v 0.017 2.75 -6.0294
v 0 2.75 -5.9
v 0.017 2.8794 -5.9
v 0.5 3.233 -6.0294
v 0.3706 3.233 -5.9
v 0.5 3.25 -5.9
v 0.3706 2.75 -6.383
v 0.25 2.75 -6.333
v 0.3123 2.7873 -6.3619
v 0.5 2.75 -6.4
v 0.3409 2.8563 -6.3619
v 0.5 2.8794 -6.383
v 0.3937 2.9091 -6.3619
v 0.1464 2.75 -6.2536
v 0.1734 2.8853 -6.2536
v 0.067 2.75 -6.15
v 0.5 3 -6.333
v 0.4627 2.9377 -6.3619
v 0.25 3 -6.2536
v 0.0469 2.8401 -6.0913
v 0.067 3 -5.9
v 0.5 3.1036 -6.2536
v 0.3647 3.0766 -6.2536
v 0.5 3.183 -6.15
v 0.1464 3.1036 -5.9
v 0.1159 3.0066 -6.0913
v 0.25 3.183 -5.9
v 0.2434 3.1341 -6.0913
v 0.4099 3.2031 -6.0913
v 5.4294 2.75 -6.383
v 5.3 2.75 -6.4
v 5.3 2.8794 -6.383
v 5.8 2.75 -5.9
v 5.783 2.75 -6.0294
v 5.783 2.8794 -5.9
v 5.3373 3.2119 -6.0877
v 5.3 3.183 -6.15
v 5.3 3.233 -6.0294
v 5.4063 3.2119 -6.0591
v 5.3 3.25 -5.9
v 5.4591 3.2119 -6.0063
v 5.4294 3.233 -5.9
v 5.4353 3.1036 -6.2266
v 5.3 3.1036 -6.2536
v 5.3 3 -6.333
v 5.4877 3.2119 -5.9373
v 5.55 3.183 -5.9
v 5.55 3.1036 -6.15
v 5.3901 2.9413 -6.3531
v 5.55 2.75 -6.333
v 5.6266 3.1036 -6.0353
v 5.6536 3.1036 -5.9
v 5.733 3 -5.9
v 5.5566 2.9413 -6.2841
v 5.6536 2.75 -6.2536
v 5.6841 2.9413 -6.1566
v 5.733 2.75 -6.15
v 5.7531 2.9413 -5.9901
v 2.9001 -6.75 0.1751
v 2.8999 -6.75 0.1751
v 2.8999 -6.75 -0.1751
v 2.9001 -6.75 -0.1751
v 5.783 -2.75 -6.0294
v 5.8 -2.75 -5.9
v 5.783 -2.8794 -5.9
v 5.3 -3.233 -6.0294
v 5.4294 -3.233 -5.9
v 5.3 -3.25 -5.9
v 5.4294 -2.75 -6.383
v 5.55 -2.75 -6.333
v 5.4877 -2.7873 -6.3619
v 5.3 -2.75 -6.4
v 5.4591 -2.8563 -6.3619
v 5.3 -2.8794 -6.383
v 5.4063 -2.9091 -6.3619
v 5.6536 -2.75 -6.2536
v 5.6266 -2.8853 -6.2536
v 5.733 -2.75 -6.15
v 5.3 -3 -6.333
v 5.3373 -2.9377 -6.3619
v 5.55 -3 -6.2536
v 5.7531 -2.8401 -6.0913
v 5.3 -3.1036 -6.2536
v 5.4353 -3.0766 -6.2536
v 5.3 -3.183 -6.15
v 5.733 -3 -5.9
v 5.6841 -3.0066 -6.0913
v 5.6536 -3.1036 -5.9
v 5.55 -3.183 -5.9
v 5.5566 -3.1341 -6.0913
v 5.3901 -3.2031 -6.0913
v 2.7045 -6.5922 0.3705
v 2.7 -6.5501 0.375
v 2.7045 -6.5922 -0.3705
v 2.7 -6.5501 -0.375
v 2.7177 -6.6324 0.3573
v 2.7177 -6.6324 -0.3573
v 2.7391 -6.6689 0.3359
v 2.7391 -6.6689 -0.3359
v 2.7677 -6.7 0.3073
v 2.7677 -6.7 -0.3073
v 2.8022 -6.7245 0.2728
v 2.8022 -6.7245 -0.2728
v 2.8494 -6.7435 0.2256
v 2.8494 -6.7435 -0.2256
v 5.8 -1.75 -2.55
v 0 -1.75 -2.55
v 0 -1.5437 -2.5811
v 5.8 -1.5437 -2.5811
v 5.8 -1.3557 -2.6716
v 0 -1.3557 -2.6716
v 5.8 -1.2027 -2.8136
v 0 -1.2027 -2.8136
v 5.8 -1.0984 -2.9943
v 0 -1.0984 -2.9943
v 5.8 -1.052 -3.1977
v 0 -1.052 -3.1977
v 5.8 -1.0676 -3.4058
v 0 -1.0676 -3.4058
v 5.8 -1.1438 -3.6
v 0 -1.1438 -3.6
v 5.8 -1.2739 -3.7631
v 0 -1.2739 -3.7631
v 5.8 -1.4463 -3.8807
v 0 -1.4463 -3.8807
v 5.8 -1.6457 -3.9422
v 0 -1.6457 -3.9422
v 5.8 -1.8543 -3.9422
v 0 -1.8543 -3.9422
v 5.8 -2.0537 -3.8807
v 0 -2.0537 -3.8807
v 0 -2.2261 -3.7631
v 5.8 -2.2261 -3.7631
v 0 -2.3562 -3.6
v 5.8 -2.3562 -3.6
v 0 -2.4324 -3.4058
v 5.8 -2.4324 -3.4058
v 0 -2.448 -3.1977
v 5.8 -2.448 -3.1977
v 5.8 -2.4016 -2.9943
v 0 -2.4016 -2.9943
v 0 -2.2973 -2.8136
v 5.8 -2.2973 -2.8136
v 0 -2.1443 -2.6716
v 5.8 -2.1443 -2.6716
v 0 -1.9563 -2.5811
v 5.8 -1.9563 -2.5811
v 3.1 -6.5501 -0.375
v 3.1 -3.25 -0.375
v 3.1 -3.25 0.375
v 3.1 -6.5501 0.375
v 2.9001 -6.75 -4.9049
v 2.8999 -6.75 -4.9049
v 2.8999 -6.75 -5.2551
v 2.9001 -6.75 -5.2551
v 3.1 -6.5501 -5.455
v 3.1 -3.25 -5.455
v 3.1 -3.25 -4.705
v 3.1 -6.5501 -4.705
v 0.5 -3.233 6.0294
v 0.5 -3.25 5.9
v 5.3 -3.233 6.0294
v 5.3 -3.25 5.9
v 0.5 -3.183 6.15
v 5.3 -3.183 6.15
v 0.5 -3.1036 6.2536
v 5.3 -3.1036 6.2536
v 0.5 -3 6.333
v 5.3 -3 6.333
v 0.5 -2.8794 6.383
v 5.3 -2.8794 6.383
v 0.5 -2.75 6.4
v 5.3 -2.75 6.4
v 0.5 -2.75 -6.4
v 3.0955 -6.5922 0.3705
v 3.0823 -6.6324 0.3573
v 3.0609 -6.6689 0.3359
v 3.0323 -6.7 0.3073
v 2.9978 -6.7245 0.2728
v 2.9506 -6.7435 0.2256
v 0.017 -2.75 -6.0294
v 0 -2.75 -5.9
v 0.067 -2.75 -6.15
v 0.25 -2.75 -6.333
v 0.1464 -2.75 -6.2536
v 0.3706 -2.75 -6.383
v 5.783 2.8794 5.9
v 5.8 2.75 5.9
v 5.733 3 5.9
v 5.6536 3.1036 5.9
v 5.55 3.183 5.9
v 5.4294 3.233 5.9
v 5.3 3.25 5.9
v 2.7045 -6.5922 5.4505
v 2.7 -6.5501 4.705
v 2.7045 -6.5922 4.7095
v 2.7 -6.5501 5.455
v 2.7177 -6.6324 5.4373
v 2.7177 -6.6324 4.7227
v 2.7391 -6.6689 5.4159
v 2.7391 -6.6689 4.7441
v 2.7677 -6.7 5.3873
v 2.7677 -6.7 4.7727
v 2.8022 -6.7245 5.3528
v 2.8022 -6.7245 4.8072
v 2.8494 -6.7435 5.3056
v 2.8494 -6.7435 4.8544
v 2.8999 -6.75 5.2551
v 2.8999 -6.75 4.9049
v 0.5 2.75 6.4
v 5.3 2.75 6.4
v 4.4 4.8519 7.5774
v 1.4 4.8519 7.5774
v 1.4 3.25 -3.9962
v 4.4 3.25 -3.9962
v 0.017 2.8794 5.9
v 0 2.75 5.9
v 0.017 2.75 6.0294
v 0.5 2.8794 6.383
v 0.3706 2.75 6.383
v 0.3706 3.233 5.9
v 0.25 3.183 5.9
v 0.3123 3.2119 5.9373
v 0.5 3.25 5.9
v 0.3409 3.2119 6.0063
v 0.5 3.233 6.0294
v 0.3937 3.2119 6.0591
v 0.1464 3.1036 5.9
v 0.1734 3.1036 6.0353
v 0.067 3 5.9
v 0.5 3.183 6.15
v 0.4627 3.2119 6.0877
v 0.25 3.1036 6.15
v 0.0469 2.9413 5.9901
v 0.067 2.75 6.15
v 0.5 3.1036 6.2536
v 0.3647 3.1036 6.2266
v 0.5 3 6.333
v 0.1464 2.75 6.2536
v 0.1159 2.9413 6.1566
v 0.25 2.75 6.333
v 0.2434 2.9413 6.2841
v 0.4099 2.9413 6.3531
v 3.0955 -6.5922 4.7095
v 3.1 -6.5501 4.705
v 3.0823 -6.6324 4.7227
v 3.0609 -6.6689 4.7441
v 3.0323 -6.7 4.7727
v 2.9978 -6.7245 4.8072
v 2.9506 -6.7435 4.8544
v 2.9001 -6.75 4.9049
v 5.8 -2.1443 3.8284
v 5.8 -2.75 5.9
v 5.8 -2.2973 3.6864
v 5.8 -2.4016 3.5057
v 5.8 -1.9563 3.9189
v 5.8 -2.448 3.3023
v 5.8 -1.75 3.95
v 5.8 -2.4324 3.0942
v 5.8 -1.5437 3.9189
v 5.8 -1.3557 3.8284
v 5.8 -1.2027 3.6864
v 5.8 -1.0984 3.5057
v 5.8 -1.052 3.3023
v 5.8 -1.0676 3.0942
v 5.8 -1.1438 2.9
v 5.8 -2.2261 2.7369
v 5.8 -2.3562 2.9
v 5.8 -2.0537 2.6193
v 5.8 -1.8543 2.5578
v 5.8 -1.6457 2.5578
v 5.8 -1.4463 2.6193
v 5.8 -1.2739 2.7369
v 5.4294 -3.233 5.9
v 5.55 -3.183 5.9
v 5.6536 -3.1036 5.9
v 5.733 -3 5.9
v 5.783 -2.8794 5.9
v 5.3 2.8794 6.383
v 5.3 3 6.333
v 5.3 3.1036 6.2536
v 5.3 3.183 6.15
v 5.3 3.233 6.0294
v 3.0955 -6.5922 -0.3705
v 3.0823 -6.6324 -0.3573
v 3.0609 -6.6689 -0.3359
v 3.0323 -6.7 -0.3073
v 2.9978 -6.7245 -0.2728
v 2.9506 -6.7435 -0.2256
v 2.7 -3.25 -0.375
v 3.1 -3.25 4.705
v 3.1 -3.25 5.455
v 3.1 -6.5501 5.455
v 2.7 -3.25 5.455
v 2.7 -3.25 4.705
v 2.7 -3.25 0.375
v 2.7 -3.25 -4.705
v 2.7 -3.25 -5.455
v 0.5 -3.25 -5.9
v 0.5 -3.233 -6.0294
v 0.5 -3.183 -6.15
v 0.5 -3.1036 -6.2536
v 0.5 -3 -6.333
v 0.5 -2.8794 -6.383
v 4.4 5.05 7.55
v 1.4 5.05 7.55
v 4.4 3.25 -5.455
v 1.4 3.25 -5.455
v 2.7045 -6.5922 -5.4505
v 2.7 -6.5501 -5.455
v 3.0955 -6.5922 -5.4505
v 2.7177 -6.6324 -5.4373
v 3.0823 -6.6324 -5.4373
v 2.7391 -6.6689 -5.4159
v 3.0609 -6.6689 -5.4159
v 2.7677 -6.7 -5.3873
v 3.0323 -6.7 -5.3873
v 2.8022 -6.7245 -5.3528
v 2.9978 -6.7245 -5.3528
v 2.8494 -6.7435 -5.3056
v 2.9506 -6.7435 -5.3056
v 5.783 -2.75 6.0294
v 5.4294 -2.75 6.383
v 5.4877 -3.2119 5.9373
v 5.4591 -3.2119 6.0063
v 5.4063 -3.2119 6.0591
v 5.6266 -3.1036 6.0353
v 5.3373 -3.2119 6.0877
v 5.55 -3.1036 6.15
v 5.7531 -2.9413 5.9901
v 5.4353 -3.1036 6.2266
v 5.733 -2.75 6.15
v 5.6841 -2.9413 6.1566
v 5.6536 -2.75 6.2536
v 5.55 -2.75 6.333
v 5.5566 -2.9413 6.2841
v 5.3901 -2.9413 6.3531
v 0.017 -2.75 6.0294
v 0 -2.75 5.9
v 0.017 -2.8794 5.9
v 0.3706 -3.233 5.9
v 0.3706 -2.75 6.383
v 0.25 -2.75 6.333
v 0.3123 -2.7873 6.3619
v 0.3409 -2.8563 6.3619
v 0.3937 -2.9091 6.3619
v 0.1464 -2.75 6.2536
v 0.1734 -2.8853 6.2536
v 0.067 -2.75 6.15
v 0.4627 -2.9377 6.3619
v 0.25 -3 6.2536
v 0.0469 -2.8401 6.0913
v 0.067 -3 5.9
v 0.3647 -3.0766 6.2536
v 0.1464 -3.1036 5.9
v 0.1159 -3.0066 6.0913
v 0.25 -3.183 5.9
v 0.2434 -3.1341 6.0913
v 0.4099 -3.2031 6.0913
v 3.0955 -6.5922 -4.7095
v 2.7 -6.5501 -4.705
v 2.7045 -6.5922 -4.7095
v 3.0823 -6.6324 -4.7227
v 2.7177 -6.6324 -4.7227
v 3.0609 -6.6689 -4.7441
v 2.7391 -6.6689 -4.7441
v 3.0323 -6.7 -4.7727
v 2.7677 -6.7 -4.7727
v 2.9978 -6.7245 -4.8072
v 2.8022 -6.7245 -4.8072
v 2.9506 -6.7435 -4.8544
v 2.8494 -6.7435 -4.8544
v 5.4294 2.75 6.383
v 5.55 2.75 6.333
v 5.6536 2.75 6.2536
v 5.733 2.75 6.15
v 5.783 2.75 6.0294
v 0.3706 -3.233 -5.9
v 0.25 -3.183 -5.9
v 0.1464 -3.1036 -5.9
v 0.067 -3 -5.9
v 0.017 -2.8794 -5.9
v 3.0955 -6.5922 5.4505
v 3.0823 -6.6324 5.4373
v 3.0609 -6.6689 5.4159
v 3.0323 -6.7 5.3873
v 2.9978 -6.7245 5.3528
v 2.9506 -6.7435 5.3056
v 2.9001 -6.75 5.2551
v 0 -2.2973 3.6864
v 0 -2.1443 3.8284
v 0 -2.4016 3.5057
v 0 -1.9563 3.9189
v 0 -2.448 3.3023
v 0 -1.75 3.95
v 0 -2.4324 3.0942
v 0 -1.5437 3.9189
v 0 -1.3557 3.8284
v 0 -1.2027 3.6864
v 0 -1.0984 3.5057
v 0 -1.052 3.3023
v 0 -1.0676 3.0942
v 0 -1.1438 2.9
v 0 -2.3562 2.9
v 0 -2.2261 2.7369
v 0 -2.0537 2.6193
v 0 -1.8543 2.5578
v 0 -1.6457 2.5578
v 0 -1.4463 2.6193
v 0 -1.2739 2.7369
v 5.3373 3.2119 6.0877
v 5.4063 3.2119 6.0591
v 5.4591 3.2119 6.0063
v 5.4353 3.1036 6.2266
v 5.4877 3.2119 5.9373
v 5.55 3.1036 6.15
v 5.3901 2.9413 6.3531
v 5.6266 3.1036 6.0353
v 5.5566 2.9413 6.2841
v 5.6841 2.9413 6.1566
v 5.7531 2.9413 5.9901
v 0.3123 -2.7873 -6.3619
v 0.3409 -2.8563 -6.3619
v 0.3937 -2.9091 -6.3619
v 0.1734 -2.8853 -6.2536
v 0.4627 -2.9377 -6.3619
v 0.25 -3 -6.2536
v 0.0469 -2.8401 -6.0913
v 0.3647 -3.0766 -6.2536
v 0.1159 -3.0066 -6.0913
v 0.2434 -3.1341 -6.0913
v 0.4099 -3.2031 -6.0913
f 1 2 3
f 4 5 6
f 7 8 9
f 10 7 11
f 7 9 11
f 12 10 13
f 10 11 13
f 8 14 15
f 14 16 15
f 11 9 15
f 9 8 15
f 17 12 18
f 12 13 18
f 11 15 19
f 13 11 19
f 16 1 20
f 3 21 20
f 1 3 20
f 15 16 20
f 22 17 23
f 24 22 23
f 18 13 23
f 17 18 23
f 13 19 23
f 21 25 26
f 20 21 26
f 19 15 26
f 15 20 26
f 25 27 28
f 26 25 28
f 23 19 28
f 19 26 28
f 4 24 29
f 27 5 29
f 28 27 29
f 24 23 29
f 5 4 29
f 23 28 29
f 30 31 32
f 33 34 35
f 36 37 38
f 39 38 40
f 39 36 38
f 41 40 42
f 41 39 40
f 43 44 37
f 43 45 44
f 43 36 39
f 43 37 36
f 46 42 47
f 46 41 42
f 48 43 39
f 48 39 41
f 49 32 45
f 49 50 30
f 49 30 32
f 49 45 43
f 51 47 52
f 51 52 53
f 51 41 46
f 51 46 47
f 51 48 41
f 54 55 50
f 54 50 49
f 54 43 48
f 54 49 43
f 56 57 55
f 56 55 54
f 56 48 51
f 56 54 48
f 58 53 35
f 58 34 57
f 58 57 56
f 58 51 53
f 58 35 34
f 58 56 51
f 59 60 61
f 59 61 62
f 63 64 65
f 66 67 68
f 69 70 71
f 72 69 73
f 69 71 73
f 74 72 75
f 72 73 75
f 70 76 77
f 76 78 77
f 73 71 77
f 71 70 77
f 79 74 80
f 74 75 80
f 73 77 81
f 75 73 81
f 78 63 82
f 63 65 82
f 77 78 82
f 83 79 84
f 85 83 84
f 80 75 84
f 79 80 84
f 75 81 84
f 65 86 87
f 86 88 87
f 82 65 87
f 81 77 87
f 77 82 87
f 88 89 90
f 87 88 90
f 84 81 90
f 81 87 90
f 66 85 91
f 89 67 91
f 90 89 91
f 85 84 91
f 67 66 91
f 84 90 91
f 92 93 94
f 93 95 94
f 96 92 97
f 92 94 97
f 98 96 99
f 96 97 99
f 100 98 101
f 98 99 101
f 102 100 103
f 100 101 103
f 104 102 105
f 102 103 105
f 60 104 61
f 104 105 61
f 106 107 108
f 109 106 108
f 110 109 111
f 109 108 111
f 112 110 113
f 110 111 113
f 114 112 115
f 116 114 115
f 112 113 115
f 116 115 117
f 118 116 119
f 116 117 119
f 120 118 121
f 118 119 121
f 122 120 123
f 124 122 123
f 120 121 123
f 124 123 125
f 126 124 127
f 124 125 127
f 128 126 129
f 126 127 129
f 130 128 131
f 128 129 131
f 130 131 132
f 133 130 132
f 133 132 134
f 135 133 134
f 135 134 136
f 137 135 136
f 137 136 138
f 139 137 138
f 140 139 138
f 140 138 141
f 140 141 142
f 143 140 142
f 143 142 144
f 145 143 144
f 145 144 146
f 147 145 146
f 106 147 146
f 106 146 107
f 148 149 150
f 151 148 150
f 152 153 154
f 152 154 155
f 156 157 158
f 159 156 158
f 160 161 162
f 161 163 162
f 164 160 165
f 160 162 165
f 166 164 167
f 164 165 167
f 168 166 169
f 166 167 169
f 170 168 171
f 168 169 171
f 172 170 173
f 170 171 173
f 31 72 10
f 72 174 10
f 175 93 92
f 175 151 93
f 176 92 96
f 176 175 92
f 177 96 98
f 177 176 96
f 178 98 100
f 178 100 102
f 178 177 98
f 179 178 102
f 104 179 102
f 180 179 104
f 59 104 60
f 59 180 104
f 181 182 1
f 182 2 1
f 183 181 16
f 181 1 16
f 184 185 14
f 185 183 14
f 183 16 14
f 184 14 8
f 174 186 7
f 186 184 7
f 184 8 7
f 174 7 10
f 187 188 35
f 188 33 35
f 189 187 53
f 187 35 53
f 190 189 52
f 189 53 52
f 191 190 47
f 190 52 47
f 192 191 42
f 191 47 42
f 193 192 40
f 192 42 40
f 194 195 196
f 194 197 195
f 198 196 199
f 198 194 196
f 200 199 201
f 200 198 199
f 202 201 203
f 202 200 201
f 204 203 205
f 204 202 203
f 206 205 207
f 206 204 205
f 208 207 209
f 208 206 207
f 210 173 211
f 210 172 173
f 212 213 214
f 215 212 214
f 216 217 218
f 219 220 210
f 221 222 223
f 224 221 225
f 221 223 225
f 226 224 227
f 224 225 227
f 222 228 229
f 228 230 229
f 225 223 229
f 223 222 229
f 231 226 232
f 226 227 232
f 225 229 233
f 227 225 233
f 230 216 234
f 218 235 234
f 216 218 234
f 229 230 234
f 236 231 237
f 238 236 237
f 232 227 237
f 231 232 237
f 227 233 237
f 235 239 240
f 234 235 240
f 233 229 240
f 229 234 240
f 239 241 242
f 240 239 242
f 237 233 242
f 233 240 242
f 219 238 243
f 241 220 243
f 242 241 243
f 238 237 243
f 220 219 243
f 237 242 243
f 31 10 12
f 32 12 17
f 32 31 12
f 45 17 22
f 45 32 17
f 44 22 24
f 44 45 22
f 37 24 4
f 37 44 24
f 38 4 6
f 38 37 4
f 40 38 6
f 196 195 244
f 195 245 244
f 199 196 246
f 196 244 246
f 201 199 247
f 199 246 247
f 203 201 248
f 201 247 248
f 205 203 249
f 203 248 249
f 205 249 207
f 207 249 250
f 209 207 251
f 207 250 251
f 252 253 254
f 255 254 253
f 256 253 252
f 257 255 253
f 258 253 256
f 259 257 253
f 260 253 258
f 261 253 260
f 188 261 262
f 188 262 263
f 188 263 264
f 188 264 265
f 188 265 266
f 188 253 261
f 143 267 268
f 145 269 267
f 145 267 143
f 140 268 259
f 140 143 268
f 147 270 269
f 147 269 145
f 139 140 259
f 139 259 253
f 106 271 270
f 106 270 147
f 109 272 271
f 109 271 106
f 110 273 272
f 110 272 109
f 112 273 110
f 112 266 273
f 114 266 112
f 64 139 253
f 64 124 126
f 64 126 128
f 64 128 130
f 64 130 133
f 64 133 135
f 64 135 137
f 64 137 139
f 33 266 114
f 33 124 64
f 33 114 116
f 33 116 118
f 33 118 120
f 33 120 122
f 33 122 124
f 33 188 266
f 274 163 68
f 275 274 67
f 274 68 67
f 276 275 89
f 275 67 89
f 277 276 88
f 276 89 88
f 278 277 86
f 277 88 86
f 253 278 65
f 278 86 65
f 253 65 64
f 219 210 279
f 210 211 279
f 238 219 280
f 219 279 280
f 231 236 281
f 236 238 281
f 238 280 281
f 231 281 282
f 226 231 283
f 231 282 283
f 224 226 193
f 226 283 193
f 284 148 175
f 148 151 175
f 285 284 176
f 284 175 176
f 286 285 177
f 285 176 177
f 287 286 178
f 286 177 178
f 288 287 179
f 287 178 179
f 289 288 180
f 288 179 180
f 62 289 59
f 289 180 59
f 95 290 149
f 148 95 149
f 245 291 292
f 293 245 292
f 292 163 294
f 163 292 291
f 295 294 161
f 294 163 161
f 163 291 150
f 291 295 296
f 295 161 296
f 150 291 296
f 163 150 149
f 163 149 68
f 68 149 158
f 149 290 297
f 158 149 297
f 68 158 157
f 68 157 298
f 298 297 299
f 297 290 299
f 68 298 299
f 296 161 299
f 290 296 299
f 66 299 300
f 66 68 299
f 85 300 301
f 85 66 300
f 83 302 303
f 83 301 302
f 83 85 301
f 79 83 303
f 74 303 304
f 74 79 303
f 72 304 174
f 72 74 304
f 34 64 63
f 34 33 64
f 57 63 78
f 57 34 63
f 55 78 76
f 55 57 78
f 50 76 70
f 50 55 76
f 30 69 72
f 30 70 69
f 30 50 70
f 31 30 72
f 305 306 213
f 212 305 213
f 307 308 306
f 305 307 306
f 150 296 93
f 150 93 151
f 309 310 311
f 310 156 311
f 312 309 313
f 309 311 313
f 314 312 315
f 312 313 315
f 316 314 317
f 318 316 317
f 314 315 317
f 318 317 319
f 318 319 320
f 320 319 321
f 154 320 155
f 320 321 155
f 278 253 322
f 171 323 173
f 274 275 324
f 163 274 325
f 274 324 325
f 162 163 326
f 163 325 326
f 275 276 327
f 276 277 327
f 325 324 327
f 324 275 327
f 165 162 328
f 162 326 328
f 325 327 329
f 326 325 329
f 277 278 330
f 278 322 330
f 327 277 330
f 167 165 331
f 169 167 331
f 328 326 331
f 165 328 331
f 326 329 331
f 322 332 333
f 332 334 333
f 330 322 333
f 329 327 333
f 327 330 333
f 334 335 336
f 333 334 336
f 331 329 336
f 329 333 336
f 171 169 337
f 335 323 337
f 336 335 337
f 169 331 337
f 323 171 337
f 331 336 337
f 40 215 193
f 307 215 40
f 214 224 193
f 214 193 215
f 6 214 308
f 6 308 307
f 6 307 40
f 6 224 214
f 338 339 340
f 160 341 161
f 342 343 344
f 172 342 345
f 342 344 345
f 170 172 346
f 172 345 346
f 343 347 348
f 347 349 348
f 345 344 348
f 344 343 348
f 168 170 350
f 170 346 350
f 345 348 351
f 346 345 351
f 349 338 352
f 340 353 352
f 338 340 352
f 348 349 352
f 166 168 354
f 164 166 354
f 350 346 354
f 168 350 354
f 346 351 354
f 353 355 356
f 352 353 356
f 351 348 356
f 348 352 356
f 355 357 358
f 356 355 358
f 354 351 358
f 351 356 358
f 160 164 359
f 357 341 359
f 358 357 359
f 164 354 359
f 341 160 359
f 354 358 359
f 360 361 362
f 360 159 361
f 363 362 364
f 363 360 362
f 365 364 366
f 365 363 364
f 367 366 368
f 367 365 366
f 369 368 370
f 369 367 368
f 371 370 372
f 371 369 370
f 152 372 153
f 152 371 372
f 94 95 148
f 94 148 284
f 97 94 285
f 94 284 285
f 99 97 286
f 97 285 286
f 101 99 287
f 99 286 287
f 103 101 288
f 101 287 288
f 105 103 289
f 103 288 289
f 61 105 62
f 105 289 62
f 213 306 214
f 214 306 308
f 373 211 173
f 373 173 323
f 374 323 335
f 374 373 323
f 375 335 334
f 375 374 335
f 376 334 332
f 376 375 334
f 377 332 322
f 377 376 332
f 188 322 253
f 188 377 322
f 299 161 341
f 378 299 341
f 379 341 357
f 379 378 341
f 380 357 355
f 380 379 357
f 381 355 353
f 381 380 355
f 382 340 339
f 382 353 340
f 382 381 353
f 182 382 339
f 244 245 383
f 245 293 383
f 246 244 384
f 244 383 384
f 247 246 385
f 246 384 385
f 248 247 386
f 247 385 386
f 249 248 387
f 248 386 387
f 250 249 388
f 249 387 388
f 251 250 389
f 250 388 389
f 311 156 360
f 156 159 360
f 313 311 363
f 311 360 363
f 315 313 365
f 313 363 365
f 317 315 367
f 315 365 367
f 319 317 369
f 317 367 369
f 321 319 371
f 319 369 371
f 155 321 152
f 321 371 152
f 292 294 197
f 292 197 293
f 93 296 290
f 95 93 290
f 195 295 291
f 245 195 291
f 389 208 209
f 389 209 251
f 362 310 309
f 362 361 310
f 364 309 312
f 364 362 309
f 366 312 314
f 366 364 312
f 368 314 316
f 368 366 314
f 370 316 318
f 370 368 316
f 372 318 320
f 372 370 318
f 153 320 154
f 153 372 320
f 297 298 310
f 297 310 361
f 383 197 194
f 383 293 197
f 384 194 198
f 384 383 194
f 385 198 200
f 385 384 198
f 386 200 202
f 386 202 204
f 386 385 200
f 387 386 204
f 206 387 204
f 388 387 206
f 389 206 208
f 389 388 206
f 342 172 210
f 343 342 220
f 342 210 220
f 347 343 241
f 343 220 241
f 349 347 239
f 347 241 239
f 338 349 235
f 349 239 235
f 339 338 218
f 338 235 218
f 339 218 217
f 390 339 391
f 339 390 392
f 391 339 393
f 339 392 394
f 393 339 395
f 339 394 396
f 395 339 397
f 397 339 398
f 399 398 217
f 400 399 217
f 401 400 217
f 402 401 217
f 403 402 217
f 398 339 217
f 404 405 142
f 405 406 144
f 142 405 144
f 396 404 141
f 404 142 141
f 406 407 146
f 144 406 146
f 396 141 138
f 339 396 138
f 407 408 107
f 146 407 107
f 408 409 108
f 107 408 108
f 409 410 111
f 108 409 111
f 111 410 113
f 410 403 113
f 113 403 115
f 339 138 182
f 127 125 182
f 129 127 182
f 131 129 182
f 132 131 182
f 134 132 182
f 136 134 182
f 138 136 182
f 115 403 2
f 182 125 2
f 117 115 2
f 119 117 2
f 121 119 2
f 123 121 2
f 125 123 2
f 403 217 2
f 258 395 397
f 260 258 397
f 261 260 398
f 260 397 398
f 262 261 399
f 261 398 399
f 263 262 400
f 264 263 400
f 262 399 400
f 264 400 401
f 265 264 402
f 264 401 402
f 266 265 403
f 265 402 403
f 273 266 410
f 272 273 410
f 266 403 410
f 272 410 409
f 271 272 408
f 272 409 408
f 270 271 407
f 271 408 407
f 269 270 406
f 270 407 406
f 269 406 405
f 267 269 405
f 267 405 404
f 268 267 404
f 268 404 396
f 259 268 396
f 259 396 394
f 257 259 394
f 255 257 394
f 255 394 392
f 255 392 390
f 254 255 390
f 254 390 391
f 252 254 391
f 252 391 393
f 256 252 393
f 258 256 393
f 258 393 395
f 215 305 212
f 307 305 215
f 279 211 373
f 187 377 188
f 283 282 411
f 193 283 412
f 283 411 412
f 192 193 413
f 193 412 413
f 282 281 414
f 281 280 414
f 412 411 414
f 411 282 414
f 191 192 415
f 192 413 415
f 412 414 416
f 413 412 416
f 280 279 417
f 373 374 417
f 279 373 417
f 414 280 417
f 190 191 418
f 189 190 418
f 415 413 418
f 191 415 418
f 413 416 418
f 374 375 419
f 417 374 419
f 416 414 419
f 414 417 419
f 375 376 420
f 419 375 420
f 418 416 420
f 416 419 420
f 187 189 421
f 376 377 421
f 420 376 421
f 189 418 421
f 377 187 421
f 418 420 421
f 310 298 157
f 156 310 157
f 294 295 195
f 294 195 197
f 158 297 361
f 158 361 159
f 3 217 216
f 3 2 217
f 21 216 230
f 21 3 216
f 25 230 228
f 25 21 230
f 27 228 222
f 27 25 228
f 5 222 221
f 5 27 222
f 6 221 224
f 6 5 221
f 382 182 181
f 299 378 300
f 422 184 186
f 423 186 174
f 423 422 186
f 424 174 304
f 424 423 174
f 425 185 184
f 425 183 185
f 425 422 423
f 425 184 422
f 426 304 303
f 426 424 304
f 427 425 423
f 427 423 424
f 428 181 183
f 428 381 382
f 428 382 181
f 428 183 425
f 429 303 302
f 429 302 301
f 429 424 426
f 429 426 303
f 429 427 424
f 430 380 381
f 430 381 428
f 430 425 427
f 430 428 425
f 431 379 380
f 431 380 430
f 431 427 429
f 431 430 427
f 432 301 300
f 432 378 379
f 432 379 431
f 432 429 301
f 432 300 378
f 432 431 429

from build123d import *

# Parameters (mm, degrees)
SKETCH3_W           = 12.8
SKETCH3_H           = 6.5
BOSS_EXTRUDE1_DEPTH = 5.8
SKETCH4_W           = 0.4
SKETCH4_H           = 0.375
SKETCH4_H_2         = 0.75
BOSS_EXTRUDE2_DEPTH = 3.5
FILLET1_R           = 0.2
CUT_EXTRUDE1_REACH  = 12.962
SKETCH5_R           = 0.7
BOSS_EXTRUDE4_START = -1.4
BOSS_EXTRUDE4_DEPTH = 3
FILLET2_R           = 0.5


with BuildPart() as part:
    # Sketch3 → Boss-Extrude1 (new body)
    with BuildSketch(Plane(origin=(0, 0, 0), x_dir=(0, 0, -1), z_dir=(1, 0, 0))):
        Rectangle(SKETCH3_W, SKETCH3_H)
    extrude(amount=BOSS_EXTRUDE1_DEPTH)

    # Sketch4 → Boss-Extrude2 (add)
    with BuildSketch(Plane.XZ.offset(3.25)):
        with Locations((2.9, -0.1875)):
            Rectangle(SKETCH4_W, SKETCH4_H)
        with Locations((2.9, 0.1875)):
            Rectangle(SKETCH4_W, SKETCH4_H)
        with Locations((2.9, 5.08)):
            Rectangle(SKETCH4_W, SKETCH4_H_2)
        with Locations((2.9, -5.08)):
            Rectangle(SKETCH4_W, SKETCH4_H_2)
    extrude(amount=BOSS_EXTRUDE2_DEPTH)

    # Fillet1
    fillet1_edges = [part.edges().sort_by_distance(p)[0] for p in [
        (3.1, -6.75, 0),
        (2.9, -6.75, 0.375),
        (2.7, -6.75, 0),
        (2.9, -6.75, -0.375),
        (3.1, -6.75, 5.08),
        (2.9, -6.75, 5.455),
        (2.7, -6.75, 5.08),
        (2.9, -6.75, 4.705),
        (2.9, -6.75, -4.705),
        (2.7, -6.75, -5.08),
        (2.9, -6.75, -5.455),
        (3.1, -6.75, -5.08),
    ]]
    fillet(fillet1_edges, radius=FILLET1_R - 0.0001)  # a hair under: the kernel refuses the full size

    # Sketch5 → Cut-Extrude1 (cut, up to next)
    with BuildSketch(Plane.ZY, mode=Mode.PRIVATE) as cut_extrude1_sk1:
        with Locations((-3.25, -1.75)):
            Circle(SKETCH5_R)
    cut_extrude1_tool1 = extrude(cut_extrude1_sk1.sketch, amount=-CUT_EXTRUDE1_REACH, mode=Mode.PRIVATE) & part.part
    # Sketch5 → Cut-Extrude1 (cut, up to next)
    with BuildSketch(Plane.ZY, mode=Mode.PRIVATE) as cut_extrude1_sk2:
        with Locations((3.25, -1.75)):
            Circle(SKETCH5_R)
    cut_extrude1_tool2 = extrude(cut_extrude1_sk2.sketch, amount=-CUT_EXTRUDE1_REACH, mode=Mode.PRIVATE) & part.part
    add(cut_extrude1_tool1.solids().sort_by_distance((0, -1.75, -3.25))[0], mode=Mode.SUBTRACT)
    add(cut_extrude1_tool2.solids().sort_by_distance((0, -1.75, 3.25))[0], mode=Mode.SUBTRACT)

    # Sketch6 → Boss-Extrude4 (add)
    with BuildSketch(Plane.ZY.offset(BOSS_EXTRUDE4_START)):
        Polygon((-5.455, 3.25), (7.55, 5.05), (7.577420264, 4.851888594), (-3.996224829, 3.25), align=None)
    extrude(amount=-BOSS_EXTRUDE4_DEPTH)

    # Fillet2
    fillet2_edges = [part.edges().sort_by_distance(p)[0] for p in [
        (5.8, 0, 6.4),
        (5.8, -3.25, 0),
        (5.8, 0, -6.4),
        (0, -3.25, 0),
        (0, 0, 6.4),
        (0, 3.25, 0),
        (0, 0, -6.4),
        (2.9, -3.25, -6.4),
        (2.9, -3.25, 6.4),
        (2.9, 3.25, 6.4),
        (2.9, 3.25, -6.4),
        (5.8, 3.25, 0),
    ]]
    fillet(fillet2_edges, radius=FILLET2_R)


solid = part.part
